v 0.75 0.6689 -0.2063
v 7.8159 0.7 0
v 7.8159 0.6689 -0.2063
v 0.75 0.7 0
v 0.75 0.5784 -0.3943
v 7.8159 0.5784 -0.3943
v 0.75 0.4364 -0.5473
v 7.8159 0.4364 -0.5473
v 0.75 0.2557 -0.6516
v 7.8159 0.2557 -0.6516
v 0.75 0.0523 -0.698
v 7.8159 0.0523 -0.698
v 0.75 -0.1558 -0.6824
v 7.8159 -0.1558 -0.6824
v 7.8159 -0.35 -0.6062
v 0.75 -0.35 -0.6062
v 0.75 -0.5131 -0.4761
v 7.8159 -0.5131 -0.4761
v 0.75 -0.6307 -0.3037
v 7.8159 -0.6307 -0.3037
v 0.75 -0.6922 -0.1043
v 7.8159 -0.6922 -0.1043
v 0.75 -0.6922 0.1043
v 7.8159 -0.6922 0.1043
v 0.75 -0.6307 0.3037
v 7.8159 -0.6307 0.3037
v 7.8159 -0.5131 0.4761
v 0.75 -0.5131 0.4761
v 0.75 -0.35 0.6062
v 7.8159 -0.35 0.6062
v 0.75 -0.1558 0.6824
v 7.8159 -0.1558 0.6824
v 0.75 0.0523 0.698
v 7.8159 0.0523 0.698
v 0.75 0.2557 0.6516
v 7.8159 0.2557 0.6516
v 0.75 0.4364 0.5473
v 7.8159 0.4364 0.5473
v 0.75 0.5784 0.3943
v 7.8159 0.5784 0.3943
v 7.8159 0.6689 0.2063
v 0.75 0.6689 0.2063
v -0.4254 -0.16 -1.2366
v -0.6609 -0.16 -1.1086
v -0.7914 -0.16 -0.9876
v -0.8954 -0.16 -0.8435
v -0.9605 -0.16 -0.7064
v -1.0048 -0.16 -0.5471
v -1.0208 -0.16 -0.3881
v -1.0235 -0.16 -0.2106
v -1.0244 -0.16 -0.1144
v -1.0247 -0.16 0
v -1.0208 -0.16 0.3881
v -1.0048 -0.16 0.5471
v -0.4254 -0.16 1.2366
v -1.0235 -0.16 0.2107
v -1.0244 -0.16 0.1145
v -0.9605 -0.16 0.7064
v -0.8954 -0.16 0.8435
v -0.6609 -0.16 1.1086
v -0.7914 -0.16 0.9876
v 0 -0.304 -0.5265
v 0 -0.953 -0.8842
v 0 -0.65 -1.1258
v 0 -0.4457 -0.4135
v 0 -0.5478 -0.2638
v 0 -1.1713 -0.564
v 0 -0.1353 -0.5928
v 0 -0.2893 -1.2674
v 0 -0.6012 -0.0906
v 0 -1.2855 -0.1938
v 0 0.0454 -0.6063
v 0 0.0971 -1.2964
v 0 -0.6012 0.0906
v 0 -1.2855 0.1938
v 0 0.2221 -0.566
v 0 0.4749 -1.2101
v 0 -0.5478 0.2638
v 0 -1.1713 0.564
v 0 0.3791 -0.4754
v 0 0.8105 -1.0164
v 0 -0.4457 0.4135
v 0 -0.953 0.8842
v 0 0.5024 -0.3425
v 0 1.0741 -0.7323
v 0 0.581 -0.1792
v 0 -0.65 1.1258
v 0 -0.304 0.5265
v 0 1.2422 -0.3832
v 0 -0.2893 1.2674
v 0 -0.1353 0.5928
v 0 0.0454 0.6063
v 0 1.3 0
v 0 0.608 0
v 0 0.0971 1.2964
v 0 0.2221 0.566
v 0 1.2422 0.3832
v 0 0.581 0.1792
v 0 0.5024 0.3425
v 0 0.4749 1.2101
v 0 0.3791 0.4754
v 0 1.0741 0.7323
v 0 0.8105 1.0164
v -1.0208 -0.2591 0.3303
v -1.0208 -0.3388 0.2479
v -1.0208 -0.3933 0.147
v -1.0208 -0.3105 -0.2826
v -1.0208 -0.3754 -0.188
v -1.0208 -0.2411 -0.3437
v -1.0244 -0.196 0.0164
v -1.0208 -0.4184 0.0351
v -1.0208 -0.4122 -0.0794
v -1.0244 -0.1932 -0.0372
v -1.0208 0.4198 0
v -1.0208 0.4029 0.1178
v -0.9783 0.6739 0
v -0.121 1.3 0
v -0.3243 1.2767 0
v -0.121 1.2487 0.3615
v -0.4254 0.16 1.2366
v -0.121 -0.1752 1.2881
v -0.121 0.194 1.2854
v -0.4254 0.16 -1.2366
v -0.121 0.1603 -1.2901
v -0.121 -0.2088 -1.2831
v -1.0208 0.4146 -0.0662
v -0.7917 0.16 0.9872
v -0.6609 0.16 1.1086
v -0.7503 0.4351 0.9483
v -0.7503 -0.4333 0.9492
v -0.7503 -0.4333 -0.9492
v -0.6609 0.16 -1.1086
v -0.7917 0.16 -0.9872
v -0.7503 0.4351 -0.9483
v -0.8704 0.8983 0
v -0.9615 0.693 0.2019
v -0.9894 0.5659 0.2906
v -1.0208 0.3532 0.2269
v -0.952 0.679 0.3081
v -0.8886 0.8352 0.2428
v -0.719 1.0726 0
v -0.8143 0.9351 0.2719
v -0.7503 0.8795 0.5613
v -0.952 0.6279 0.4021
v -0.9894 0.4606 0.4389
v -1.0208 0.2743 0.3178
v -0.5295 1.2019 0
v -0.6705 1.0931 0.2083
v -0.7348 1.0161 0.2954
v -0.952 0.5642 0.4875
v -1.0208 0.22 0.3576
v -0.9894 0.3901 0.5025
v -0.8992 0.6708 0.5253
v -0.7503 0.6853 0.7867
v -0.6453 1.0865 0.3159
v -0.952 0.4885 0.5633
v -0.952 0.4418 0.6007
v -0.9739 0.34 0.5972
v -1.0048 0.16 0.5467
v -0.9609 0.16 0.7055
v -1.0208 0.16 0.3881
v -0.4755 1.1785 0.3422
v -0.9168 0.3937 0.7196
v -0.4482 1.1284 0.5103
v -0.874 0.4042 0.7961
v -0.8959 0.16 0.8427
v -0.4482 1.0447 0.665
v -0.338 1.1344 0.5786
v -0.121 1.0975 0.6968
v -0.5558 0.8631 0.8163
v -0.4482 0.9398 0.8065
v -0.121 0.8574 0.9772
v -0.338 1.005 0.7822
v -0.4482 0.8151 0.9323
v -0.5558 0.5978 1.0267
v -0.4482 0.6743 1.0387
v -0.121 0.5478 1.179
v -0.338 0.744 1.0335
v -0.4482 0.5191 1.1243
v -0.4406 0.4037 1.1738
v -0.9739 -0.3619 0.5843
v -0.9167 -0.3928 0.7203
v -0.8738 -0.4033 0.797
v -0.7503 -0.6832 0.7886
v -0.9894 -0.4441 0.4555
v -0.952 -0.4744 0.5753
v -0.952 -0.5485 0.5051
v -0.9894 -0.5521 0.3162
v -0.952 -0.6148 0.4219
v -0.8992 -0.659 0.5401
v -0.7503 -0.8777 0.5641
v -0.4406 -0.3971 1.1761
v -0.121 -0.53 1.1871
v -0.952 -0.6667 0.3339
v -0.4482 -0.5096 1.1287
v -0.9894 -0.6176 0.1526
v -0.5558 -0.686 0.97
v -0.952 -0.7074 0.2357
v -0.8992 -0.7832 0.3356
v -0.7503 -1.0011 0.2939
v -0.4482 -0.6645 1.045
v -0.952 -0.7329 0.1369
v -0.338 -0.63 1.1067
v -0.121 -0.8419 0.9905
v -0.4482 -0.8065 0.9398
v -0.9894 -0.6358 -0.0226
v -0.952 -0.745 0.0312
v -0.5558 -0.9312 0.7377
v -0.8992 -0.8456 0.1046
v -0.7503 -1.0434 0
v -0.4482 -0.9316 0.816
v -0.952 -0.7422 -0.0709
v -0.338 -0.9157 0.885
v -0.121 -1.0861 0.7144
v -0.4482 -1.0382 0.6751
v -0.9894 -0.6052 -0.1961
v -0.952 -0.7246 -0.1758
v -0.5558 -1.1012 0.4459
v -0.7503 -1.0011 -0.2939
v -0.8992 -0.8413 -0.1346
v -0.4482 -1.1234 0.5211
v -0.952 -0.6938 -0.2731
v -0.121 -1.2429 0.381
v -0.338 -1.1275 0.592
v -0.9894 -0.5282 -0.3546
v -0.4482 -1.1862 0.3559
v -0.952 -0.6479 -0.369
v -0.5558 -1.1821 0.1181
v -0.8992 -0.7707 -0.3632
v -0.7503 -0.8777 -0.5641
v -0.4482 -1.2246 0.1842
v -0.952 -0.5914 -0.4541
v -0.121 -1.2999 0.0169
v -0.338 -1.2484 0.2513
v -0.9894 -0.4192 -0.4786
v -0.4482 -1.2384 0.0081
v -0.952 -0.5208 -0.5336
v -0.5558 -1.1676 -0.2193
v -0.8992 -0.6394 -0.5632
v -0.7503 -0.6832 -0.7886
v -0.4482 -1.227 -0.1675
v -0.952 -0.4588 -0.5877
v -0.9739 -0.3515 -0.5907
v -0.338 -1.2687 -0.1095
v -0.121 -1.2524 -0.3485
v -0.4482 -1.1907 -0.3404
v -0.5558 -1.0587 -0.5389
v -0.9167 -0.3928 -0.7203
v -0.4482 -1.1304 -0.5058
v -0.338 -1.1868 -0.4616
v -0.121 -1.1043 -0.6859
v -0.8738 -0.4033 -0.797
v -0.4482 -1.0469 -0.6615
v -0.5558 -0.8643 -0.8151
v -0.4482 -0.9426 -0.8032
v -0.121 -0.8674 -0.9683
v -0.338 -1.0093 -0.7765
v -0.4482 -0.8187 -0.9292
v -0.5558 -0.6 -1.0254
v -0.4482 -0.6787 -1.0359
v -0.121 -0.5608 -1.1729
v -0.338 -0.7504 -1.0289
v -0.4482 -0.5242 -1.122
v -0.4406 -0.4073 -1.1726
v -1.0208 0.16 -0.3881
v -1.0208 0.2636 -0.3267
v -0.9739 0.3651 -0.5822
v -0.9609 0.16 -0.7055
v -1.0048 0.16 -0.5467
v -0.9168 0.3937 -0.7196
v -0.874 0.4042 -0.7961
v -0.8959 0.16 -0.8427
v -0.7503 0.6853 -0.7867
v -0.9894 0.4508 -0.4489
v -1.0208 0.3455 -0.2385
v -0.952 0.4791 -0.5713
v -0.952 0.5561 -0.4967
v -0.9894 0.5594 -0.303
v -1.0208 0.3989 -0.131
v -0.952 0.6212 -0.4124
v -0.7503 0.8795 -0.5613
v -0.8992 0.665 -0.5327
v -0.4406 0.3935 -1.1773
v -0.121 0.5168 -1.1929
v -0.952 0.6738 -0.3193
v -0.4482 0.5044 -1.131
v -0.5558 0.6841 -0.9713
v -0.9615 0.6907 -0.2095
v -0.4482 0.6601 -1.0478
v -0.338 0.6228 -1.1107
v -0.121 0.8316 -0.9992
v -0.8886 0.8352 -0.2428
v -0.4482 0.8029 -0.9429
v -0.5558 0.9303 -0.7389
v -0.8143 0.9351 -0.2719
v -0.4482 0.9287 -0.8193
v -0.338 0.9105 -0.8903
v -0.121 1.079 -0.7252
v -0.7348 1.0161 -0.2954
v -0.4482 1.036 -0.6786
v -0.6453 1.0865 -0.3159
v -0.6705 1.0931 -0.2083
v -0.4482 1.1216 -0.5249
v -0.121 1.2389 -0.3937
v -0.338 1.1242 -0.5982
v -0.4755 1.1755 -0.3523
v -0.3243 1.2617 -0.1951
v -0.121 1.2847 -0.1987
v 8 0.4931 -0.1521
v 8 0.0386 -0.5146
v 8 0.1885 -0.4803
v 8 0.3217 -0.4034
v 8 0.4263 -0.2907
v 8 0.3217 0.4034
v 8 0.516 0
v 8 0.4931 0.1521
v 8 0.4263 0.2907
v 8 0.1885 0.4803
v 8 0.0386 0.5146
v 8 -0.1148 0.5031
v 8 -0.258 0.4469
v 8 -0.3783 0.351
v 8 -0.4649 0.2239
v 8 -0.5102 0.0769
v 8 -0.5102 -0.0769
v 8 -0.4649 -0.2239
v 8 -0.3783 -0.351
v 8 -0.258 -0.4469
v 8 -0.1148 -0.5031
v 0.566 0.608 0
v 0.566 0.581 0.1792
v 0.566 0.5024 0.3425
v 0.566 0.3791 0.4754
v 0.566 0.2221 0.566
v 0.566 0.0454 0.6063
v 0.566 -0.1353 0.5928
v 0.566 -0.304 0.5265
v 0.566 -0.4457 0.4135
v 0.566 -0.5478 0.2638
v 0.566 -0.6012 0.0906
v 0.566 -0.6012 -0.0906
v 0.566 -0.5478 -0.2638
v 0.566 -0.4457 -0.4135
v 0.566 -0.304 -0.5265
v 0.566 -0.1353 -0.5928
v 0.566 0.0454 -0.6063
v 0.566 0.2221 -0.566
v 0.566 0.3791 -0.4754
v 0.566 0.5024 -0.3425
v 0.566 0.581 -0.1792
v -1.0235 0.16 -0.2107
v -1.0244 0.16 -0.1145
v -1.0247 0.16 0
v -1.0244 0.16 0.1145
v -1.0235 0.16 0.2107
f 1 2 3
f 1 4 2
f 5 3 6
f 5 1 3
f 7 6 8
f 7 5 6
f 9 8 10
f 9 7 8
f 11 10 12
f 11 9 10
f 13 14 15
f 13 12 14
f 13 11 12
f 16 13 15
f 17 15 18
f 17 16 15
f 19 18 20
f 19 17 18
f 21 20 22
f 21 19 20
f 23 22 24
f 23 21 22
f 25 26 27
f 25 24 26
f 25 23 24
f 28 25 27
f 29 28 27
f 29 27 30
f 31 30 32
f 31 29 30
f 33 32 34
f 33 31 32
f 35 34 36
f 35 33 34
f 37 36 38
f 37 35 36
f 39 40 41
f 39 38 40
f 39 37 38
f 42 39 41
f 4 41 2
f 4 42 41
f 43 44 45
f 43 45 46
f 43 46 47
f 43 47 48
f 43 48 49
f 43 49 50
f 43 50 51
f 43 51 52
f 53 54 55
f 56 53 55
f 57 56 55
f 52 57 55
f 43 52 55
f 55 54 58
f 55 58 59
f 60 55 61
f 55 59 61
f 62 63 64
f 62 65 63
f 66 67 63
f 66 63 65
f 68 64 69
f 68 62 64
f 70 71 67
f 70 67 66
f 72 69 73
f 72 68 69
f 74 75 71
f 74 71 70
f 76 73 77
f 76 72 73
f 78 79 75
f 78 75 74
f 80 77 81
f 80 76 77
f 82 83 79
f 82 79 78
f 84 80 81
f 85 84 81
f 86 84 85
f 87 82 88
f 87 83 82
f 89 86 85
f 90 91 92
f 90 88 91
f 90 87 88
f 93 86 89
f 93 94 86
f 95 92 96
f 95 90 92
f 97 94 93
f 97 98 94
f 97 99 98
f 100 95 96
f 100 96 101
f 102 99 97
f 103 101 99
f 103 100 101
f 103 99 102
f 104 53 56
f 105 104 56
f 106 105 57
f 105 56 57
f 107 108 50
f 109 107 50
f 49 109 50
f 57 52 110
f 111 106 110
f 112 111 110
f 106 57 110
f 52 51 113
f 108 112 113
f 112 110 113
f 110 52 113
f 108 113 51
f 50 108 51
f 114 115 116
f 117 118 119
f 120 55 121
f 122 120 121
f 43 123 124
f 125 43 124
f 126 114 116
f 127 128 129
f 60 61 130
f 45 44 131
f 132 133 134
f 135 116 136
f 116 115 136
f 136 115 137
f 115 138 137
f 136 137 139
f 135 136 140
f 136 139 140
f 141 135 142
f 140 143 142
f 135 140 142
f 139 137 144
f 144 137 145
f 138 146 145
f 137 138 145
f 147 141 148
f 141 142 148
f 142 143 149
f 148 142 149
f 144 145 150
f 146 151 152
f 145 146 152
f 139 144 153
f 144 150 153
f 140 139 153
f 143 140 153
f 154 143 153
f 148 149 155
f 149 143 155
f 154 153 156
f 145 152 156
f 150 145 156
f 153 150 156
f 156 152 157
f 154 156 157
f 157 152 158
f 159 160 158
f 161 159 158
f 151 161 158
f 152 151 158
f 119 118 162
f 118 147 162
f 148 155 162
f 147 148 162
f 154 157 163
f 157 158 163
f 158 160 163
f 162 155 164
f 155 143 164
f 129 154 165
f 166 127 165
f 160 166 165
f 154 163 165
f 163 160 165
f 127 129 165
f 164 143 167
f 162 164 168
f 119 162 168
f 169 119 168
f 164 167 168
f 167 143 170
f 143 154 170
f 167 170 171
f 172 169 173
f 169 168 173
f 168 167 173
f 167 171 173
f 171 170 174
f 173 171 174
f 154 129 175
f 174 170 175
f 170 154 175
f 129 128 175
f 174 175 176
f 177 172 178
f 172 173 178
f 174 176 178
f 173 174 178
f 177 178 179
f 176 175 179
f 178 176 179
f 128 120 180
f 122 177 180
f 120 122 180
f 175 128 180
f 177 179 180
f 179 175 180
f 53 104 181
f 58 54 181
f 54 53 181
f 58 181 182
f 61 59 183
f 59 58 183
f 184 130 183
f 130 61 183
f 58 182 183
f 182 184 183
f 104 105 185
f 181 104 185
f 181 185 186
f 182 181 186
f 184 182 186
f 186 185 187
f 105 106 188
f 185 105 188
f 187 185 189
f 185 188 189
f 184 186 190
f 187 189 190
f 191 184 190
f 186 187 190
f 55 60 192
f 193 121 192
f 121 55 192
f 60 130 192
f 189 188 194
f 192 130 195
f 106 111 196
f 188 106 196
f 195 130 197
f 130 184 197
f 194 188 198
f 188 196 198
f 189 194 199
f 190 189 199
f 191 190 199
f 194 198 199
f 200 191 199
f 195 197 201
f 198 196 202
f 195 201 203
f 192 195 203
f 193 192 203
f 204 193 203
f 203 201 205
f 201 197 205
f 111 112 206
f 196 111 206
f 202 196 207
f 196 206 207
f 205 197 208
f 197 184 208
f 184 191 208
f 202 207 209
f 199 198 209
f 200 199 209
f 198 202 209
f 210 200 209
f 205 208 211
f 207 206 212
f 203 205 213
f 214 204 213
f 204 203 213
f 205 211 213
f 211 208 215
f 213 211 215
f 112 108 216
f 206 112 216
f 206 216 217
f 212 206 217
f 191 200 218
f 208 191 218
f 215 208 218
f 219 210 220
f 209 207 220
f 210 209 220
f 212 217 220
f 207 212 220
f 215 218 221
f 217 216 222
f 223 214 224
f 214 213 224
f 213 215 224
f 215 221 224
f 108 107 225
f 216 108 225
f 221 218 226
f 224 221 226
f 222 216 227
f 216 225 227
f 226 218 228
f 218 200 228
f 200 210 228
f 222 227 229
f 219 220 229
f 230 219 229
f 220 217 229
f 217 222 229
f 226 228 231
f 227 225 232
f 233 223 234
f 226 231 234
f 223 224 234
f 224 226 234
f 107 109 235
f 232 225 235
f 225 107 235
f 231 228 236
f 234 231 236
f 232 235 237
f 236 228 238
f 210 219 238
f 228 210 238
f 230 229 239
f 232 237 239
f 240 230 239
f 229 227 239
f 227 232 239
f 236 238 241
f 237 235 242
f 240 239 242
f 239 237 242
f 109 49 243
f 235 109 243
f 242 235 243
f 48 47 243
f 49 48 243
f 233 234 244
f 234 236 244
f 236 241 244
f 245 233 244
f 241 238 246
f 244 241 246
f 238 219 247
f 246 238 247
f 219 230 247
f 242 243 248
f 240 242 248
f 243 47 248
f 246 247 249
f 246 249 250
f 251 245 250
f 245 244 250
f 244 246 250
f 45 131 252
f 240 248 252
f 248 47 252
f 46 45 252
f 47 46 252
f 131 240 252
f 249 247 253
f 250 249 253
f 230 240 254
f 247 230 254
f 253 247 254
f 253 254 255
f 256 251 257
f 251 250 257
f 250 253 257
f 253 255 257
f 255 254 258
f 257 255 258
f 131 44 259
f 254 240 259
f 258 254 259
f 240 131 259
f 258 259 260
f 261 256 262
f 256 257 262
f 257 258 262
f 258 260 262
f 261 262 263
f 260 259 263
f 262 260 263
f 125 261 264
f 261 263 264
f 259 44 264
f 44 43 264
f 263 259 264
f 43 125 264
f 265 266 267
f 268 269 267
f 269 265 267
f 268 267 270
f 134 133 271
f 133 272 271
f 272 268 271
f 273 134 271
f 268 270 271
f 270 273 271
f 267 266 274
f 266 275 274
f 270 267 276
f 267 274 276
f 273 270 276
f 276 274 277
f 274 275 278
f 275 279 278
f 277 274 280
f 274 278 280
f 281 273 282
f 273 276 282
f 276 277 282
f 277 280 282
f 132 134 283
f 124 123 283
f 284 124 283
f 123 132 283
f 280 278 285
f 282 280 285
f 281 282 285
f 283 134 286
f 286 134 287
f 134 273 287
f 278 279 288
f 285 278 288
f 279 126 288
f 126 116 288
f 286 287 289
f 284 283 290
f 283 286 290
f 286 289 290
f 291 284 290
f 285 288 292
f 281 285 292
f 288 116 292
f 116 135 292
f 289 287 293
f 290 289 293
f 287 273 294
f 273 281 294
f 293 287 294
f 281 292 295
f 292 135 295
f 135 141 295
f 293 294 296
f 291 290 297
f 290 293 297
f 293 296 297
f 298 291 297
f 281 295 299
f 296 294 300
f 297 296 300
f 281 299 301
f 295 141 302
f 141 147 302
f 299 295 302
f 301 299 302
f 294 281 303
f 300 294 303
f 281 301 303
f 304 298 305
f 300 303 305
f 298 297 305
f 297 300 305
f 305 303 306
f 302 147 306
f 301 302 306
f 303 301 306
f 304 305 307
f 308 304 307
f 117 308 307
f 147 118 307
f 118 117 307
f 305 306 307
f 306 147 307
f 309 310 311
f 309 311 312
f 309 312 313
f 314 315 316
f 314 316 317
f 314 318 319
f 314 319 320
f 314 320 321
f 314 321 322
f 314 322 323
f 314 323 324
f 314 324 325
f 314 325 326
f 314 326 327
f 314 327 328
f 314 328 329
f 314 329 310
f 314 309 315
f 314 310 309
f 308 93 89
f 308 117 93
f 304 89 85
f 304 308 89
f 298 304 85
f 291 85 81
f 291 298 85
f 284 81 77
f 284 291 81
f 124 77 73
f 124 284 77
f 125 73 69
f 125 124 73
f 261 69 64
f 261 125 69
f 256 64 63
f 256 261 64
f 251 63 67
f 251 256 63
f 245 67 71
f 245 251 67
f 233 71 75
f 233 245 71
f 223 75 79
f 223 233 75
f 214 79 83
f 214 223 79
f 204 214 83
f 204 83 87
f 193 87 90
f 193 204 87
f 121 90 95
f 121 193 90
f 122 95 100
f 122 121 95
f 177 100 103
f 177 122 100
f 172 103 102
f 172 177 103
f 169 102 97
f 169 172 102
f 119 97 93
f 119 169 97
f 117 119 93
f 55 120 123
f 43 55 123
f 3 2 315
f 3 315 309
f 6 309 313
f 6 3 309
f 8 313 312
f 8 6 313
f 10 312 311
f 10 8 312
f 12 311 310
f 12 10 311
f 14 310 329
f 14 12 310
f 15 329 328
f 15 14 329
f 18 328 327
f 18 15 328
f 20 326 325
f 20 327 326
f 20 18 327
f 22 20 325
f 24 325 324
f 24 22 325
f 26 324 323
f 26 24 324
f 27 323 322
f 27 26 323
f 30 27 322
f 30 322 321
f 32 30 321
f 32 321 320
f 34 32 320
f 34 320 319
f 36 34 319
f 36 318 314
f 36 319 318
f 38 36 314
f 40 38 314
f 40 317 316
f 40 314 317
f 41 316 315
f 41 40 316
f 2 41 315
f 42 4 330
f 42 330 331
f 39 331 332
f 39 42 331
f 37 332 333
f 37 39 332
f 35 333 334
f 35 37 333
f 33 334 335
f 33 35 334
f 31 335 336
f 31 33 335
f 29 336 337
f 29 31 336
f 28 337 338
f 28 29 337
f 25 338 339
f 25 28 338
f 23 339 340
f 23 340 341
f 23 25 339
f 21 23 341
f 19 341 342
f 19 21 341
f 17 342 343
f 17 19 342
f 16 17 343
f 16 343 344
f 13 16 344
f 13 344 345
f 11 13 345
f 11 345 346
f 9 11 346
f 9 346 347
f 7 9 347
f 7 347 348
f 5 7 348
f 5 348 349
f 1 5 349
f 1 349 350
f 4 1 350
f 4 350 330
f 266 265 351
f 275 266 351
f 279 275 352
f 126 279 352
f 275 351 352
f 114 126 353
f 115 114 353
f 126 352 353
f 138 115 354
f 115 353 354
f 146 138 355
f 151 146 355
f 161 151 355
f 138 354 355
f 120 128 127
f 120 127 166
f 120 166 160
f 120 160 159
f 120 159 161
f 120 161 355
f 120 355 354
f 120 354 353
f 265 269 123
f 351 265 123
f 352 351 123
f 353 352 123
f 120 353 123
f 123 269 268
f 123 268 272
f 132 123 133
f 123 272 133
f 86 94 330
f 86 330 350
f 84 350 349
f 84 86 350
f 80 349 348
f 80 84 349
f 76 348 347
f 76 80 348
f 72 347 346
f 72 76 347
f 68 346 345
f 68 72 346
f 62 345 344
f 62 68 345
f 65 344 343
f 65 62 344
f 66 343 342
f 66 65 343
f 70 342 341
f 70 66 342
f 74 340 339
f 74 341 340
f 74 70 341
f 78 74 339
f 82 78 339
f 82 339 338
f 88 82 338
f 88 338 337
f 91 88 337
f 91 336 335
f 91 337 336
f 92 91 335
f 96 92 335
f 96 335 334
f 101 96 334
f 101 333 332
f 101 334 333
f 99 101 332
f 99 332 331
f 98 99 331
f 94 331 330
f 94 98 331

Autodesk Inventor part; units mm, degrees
ref_plane "YZ Plane" through (0, 0, 0) normal (1, 0, 0) x (0, 1, 0)
sketch "Sketch1" plane through (0, 0, 0) normal (0, 0, 1) x (1, 0, 0)
  line L0 (-1.0254, 0) -> (8, 0)
  line L1 (8, 0) -> (8, 0.7)
  line L2 (8, 0.7) -> (0.75, 0.7)
  line L3 (0.75, 0.7) -> (0.566, 0.608)
  line L4 (0.566, 0.608) -> (0, 0.608)
  line L5 (0, 0.608) -> (0, 1.3)
  line L6 (-4.8605, 0) -> (21.908, 0) projected
  line L7 (0, -0.26) -> (0, 1.5602) projected
  line L8 (0, 1.3) -> (-0.9811, 1.2998)
  arc A0 (-0.9811, 1.2998) -> (-1.0254, 0) centre (18.0839, 0) ccw
  dimension "d0" = 8
  dimension "d1" = 7.25
  dimension "d2" = 0.184
  dimension "d3" = 1.0254
  dimension "d4" = 1.4
  dimension "d5" = 1.216
  dimension "d9" = 2.6
  dimension "d10" = 0.01
  dimension "d15" = 19.1093
revolve "Body" add sketch "Sketch1" angle 360 about axis through (-1.0254, 0, 0) along (1, 0, 0)
fillet "Fillet1" radius 0.9 1 edges at (-0.9811, -1.2998, 0)
ref_plane "IDS_WORKPLANE{1}" through (-1.0254, 0, 0) normal (1, 0, 0) x (0, 0, -1)
sketch "Sketch2" plane through (-1.0254, 0, 0) normal (1, 0, 0) x (0, 0, -1)
  line L0 (0, -1.82) -> (0, 1.82) projected
  line L1 (1.82, 0) -> (-1.82, 0) projected
  line L2 (-1.3, 0.16) -> (1.3, 0.16)
  line L3 (1.3, 0.16) -> (1.3, -0.16)
  line L4 (1.3, -0.16) -> (-1.3, -0.16)
  line L5 (-1.3, -0.16) -> (-1.3, 0.16)
  line L6 (0, 0.16) -> (0, -0.16) construction
  line L7 (-1.3, 0) -> (1.3, 0) construction
  circle A0 centre (0, 0) radius 1.3 projected
  dimension "d17" = 0.32
extrude "Slot" cut sketch "Sketch2" along normal blind 0.6 contours L4 A0 L1 L0 | L0 L1 A0 L4 | L4 L5 A0 | A0 L3 L4 | L1 A0 L2 L0 | L0 L2 A0 L1 | L5 L2 A0 | A0 L2 L3
thread "Thread" size "M1.4x0.3" class "6g" standard "ISO Metric profile" length 7.25
chamfer "Chamfer1" distance 0.184 distance2 0.1841 1 edges at (8, -0.7, 0) measured on face at (8, 0.4839, -0.1193)
ref_plane "Work Plane2" through (8.25, 0, 0) normal (0, 0, -1) x (1, 0, 0)
equation "\"d17\" = SBR"
equation "\"d18\" = STI"
equation "\"d20\" = RR"
equation "\"d11\" = GEL"
equation "\"d13\" = -0.5 * SPD + 0.5 * GD"
equation "\"d0\" = NLG"
equation "\"d1\" = GEL"
equation "\"d2\" = GAL"
equation "\"d3\" = KOH"
equation "\"d4\" = GD"
equation "\"d5\" = BDM"
equation "\"d9\" = KOD"
equation "\"d10\" = KEWI"
equation "\"GD\" = NND"
equation "\"NLG\" = 8"
equation "\"GEL\" = 7.25"
equation "\"KOD\" = 2.6"
equation "\"KOH\" = 1.02539"
equation "\"GAL\" = 0.61345 * PTC"
equation "\"SPD\" = NND - 1.2269 * PTC"
equation "\"BDM\" = 1.216"
equation "\"GUL\" = 0.61345 * PTC"
equation "\"RR\" = 0.9"
equation "\"SBR\" = 0.32"
equation "\"STI\" = 0.6"
equation "\"KEWI\" = 0.01deg"
equation "\"KR\" = 1.6"
equation "\"d16\" = -KOH"
equation "\"PTC\" = 0.3"
equation "\"THREADDIA\" = 1.4"
equation "\"TOA\" = 30deg"
equation "\"NND\" = 1.4"
equation "\"ORI\" = 0.9"
equation "\"GD1\" = THREADDIA - 1.2269 * PTC"
properties part number "CNS 9671 - M1,4 x 8" material "Steel, Mild"
